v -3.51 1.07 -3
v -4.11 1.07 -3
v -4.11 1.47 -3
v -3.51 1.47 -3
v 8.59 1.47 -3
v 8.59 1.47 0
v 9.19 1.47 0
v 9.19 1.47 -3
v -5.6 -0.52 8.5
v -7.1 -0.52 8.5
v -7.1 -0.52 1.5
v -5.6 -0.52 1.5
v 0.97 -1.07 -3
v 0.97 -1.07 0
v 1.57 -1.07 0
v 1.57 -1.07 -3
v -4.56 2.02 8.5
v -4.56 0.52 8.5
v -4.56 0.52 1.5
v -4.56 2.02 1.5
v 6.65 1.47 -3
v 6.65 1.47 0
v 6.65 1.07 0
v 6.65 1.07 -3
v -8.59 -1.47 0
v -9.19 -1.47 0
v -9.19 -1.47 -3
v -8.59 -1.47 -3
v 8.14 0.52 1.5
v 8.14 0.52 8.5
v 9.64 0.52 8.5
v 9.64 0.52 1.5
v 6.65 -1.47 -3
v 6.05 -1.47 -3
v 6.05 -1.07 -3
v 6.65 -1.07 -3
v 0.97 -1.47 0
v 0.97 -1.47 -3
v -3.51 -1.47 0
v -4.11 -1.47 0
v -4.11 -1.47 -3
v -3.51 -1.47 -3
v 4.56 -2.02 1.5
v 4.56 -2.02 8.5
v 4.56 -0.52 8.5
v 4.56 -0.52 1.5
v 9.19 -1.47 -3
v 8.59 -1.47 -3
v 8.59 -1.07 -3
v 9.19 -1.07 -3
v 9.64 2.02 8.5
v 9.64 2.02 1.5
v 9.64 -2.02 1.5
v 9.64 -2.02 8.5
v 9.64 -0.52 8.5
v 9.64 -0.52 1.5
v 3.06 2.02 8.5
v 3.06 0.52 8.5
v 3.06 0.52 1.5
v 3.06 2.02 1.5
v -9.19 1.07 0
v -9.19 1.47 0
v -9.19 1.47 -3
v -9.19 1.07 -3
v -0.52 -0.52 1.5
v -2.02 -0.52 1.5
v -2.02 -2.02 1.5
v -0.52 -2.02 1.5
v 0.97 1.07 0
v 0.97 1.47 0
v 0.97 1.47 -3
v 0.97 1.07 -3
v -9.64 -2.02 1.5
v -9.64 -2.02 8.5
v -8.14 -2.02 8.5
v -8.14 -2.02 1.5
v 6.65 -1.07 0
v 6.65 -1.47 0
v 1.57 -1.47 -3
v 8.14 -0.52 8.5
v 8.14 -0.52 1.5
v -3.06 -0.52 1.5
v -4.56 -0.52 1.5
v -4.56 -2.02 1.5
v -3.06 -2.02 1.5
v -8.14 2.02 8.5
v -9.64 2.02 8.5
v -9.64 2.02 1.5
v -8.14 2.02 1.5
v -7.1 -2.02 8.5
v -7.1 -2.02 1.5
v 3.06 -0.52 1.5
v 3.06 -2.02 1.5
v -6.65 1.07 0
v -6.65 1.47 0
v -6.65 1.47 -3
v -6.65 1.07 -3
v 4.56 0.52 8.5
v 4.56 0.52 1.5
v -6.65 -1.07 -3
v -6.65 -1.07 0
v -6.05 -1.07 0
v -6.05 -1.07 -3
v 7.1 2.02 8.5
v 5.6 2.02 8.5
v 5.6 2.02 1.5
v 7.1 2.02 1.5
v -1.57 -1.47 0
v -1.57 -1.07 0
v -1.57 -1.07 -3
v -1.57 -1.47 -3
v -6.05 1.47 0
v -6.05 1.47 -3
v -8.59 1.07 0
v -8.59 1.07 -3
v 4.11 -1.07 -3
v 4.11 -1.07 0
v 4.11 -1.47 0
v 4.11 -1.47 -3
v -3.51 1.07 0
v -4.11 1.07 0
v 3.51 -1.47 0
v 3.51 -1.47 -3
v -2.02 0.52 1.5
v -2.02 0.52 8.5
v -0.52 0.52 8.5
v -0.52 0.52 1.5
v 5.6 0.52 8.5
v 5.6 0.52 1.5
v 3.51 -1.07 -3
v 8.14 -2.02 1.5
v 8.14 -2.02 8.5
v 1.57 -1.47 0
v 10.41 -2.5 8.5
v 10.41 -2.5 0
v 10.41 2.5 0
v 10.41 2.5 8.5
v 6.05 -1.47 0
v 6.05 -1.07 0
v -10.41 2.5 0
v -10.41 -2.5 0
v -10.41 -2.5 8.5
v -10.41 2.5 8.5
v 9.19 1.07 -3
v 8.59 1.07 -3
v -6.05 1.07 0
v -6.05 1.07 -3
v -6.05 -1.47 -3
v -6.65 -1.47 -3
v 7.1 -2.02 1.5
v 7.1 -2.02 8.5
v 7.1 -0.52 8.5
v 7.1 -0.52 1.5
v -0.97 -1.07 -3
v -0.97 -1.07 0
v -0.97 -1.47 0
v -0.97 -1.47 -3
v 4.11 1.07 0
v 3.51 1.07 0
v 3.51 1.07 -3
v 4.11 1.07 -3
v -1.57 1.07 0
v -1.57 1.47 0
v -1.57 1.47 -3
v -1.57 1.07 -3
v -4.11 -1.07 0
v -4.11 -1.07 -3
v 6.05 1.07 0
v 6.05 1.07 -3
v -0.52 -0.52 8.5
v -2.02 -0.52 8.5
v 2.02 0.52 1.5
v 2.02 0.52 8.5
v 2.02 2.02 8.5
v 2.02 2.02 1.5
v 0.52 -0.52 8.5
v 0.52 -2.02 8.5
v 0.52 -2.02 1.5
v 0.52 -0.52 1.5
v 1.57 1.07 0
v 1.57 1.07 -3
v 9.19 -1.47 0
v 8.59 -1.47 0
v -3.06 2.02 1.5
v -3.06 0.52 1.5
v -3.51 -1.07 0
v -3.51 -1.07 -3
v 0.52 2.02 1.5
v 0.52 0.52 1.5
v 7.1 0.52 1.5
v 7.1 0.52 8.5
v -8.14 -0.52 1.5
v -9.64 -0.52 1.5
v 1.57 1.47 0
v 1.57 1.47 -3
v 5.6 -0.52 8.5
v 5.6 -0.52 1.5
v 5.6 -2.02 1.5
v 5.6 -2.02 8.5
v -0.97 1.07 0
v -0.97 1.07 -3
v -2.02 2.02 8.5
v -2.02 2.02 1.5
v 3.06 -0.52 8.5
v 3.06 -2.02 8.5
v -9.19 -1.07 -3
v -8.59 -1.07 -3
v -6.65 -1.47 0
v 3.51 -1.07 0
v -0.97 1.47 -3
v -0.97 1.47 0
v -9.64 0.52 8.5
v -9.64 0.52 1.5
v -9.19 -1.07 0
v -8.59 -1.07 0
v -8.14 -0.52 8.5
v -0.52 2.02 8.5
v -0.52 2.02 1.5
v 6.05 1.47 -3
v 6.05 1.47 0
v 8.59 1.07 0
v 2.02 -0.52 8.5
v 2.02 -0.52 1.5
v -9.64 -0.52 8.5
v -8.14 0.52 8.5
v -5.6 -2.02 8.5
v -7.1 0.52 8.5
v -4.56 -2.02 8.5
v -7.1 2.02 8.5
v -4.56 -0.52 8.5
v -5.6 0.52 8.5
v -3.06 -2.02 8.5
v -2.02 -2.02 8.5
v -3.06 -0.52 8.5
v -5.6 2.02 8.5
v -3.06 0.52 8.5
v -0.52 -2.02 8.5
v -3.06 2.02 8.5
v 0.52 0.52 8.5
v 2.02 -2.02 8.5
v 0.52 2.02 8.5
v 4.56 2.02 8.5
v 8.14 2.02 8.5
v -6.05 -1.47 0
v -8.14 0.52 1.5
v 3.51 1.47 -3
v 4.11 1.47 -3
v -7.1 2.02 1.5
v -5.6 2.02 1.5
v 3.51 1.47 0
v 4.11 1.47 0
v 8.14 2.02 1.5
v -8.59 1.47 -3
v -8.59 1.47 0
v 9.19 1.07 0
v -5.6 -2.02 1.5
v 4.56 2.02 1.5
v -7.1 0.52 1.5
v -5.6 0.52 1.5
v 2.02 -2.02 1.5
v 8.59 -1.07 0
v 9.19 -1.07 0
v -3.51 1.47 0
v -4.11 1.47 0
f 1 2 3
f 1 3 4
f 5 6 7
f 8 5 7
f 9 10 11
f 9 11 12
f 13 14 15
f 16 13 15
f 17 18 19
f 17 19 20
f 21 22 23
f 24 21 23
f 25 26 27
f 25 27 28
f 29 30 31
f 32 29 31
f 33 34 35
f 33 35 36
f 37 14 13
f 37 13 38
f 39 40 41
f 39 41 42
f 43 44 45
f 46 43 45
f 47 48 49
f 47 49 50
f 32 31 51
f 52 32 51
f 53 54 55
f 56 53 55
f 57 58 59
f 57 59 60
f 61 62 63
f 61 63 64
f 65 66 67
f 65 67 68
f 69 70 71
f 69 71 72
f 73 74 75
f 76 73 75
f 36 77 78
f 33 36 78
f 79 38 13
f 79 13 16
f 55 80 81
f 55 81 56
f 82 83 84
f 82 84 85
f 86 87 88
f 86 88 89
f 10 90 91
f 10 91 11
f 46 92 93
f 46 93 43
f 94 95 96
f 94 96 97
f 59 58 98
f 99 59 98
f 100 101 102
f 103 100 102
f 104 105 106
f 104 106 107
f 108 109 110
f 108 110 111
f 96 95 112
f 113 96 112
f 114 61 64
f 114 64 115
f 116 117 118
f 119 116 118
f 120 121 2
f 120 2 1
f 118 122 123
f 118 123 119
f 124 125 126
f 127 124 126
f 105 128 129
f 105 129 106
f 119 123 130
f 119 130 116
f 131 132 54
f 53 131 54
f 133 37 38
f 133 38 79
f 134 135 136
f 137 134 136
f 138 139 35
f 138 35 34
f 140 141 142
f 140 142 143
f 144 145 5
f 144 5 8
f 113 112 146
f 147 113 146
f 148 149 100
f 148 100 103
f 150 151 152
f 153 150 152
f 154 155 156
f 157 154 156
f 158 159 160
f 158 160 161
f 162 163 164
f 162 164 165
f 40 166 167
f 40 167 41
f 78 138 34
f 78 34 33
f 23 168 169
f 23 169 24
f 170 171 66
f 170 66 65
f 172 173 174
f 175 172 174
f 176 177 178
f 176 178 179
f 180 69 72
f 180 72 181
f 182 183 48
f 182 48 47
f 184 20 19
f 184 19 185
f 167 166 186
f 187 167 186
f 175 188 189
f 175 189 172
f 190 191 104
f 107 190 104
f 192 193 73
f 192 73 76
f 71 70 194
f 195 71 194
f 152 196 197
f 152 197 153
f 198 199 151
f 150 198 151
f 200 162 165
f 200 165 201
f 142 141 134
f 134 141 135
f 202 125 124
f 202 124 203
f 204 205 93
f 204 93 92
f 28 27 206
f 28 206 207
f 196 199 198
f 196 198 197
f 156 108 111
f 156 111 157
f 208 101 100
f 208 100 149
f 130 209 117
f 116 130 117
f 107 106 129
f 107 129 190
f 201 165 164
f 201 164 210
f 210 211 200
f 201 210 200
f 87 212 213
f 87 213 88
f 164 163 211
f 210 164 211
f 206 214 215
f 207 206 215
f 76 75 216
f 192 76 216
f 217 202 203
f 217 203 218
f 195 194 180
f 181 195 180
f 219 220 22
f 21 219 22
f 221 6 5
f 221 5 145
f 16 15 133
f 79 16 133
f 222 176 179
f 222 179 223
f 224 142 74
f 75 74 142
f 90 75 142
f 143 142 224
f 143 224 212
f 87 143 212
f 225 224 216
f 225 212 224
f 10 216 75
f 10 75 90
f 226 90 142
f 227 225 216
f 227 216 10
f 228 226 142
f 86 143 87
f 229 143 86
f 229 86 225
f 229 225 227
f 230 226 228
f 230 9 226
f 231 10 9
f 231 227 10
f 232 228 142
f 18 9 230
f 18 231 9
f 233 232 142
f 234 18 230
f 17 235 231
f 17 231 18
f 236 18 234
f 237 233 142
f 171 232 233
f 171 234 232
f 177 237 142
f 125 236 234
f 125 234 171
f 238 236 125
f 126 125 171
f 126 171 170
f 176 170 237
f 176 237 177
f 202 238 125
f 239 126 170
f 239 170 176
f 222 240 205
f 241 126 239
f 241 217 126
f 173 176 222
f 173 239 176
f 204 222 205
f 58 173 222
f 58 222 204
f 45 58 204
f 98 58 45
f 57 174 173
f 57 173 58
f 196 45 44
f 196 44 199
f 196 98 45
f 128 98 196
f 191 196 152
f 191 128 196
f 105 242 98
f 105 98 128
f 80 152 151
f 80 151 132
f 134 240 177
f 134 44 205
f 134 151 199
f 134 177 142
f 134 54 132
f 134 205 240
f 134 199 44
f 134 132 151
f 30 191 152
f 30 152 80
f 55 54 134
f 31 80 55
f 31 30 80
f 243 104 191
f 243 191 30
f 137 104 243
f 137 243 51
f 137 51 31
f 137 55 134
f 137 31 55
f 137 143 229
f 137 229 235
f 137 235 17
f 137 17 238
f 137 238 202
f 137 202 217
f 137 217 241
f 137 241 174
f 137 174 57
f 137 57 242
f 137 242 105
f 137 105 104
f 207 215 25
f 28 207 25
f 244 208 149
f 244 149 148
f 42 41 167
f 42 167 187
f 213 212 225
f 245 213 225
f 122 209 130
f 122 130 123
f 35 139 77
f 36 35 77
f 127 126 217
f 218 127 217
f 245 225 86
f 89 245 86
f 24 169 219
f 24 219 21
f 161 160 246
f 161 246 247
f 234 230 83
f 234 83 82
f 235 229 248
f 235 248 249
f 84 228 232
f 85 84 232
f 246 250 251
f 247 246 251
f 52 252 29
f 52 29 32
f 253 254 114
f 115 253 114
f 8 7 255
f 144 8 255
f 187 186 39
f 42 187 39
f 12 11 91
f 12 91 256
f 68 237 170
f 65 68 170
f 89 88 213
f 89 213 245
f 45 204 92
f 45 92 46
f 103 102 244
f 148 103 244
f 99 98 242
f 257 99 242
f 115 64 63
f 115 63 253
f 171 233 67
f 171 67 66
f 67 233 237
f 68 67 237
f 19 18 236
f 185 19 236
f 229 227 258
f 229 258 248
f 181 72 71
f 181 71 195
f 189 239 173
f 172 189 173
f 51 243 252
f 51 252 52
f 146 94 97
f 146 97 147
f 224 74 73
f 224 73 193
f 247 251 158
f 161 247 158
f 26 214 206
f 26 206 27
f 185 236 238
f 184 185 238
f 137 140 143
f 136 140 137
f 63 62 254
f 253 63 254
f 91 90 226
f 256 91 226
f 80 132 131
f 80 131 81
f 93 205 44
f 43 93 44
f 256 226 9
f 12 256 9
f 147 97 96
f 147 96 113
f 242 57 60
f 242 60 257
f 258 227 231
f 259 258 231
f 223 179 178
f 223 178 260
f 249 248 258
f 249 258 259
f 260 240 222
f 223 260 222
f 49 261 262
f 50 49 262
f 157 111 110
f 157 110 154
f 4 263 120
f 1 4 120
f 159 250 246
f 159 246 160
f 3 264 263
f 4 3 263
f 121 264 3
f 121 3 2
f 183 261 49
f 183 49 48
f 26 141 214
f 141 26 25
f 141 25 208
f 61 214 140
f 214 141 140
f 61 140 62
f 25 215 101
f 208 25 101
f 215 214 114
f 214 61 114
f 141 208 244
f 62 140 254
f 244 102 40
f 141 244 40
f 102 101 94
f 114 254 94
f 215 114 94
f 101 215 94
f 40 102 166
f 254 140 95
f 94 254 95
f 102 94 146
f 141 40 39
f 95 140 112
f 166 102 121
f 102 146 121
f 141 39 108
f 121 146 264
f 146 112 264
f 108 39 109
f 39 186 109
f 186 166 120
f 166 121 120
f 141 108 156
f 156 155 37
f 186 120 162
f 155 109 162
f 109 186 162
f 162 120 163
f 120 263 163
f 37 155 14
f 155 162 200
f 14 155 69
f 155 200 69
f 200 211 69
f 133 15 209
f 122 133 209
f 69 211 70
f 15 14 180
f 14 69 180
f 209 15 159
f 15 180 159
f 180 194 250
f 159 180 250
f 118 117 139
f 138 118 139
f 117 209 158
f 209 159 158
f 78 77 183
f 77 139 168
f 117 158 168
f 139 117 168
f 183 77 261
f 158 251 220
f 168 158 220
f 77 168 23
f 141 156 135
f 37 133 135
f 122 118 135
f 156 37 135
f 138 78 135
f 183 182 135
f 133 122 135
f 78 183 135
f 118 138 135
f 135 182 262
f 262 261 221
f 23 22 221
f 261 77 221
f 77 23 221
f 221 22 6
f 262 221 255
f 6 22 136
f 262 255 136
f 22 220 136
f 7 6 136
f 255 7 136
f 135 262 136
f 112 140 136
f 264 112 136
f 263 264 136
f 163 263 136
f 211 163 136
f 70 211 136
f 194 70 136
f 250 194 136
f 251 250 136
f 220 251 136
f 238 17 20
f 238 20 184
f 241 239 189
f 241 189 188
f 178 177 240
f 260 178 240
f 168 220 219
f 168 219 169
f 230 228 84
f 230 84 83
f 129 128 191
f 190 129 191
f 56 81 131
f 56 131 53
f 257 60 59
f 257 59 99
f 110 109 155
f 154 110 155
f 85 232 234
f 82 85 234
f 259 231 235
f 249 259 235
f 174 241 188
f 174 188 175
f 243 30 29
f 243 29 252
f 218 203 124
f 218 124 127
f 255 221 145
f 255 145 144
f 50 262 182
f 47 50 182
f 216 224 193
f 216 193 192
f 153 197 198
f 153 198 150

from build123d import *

# Parameters (mm, degrees)
F0_W     = 20.82
F0_H     = 5
F1_DEPTH = 8.5
F2_W     = 1.5
F2_H     = 1.5
F3_DEPTH = 7
F4_W     = 0.6
F4_H     = 0.4
F5_DEPTH = 3


with BuildPart() as f1:
    # F0 (on Top) → F1 (new body)
    with BuildSketch(Plane.XY):
        Rectangle(F0_W, F0_H)
    extrude(amount=F1_DEPTH)

    # F2 (on face) → F3 (cut)
    with BuildSketch(Plane.XY.offset(8.5)):
        with Locations((-8.89, 1.27)):
            Rectangle(F2_W, F2_H)
        with Locations((-8.89, -1.27)):
            Rectangle(F2_W, F2_H)
        with Locations((-6.35, 1.27)):
            Rectangle(F2_W, F2_H)
        with Locations((-6.35, -1.27)):
            Rectangle(F2_W, F2_H)
        with Locations((-3.81, 1.27)):
            Rectangle(F2_W, F2_H)
        with Locations((-3.81, -1.27)):
            Rectangle(F2_W, F2_H)
        with Locations((-1.27, 1.27)):
            Rectangle(F2_W, F2_H)
        with Locations((-1.27, -1.27)):
            Rectangle(F2_W, F2_H)
        with Locations((1.27, 1.27)):
            Rectangle(F2_W, F2_H)
        with Locations((1.27, -1.27)):
            Rectangle(F2_W, F2_H)
        with Locations((3.81, 1.27)):
            Rectangle(F2_W, F2_H)
        with Locations((3.81, -1.27)):
            Rectangle(F2_W, F2_H)
        with Locations((6.35, 1.27)):
            Rectangle(F2_W, F2_H)
        with Locations((6.35, -1.27)):
            Rectangle(F2_W, F2_H)
        with Locations((8.89, 1.27)):
            Rectangle(F2_W, F2_H)
        with Locations((8.89, -1.27)):
            Rectangle(F2_W, F2_H)
    extrude(amount=-F3_DEPTH, mode=Mode.SUBTRACT)

    # F4 (on face) → F5 (join)
    with BuildSketch(Plane(origin=(0, 0, 0), x_dir=(1, 0, 0), z_dir=(0, 0, -1))):
        with Locations((-8.89, 1.27)):
            Rectangle(F4_W, F4_H)
        with Locations((-8.89, -1.27)):
            Rectangle(F4_W, F4_H)
        with Locations((-6.35, 1.27)):
            Rectangle(F4_W, F4_H)
        with Locations((-6.35, -1.27)):
            Rectangle(F4_W, F4_H)
        with Locations((-3.81, 1.27)):
            Rectangle(F4_W, F4_H)
        with Locations((-3.81, -1.27)):
            Rectangle(F4_W, F4_H)
        with Locations((-1.27, 1.27)):
            Rectangle(F4_W, F4_H)
        with Locations((-1.27, -1.27)):
            Rectangle(F4_W, F4_H)
        with Locations((1.27, 1.27)):
            Rectangle(F4_W, F4_H)
        with Locations((1.27, -1.27)):
            Rectangle(F4_W, F4_H)
        with Locations((3.81, 1.27)):
            Rectangle(F4_W, F4_H)
        with Locations((3.81, -1.27)):
            Rectangle(F4_W, F4_H)
        with Locations((6.35, 1.27)):
            Rectangle(F4_W, F4_H)
        with Locations((6.35, -1.27)):
            Rectangle(F4_W, F4_H)
        with Locations((8.89, 1.27)):
            Rectangle(F4_W, F4_H)
        with Locations((8.89, -1.27)):
            Rectangle(F4_W, F4_H)
    extrude(amount=F5_DEPTH)


solid = f1.part
